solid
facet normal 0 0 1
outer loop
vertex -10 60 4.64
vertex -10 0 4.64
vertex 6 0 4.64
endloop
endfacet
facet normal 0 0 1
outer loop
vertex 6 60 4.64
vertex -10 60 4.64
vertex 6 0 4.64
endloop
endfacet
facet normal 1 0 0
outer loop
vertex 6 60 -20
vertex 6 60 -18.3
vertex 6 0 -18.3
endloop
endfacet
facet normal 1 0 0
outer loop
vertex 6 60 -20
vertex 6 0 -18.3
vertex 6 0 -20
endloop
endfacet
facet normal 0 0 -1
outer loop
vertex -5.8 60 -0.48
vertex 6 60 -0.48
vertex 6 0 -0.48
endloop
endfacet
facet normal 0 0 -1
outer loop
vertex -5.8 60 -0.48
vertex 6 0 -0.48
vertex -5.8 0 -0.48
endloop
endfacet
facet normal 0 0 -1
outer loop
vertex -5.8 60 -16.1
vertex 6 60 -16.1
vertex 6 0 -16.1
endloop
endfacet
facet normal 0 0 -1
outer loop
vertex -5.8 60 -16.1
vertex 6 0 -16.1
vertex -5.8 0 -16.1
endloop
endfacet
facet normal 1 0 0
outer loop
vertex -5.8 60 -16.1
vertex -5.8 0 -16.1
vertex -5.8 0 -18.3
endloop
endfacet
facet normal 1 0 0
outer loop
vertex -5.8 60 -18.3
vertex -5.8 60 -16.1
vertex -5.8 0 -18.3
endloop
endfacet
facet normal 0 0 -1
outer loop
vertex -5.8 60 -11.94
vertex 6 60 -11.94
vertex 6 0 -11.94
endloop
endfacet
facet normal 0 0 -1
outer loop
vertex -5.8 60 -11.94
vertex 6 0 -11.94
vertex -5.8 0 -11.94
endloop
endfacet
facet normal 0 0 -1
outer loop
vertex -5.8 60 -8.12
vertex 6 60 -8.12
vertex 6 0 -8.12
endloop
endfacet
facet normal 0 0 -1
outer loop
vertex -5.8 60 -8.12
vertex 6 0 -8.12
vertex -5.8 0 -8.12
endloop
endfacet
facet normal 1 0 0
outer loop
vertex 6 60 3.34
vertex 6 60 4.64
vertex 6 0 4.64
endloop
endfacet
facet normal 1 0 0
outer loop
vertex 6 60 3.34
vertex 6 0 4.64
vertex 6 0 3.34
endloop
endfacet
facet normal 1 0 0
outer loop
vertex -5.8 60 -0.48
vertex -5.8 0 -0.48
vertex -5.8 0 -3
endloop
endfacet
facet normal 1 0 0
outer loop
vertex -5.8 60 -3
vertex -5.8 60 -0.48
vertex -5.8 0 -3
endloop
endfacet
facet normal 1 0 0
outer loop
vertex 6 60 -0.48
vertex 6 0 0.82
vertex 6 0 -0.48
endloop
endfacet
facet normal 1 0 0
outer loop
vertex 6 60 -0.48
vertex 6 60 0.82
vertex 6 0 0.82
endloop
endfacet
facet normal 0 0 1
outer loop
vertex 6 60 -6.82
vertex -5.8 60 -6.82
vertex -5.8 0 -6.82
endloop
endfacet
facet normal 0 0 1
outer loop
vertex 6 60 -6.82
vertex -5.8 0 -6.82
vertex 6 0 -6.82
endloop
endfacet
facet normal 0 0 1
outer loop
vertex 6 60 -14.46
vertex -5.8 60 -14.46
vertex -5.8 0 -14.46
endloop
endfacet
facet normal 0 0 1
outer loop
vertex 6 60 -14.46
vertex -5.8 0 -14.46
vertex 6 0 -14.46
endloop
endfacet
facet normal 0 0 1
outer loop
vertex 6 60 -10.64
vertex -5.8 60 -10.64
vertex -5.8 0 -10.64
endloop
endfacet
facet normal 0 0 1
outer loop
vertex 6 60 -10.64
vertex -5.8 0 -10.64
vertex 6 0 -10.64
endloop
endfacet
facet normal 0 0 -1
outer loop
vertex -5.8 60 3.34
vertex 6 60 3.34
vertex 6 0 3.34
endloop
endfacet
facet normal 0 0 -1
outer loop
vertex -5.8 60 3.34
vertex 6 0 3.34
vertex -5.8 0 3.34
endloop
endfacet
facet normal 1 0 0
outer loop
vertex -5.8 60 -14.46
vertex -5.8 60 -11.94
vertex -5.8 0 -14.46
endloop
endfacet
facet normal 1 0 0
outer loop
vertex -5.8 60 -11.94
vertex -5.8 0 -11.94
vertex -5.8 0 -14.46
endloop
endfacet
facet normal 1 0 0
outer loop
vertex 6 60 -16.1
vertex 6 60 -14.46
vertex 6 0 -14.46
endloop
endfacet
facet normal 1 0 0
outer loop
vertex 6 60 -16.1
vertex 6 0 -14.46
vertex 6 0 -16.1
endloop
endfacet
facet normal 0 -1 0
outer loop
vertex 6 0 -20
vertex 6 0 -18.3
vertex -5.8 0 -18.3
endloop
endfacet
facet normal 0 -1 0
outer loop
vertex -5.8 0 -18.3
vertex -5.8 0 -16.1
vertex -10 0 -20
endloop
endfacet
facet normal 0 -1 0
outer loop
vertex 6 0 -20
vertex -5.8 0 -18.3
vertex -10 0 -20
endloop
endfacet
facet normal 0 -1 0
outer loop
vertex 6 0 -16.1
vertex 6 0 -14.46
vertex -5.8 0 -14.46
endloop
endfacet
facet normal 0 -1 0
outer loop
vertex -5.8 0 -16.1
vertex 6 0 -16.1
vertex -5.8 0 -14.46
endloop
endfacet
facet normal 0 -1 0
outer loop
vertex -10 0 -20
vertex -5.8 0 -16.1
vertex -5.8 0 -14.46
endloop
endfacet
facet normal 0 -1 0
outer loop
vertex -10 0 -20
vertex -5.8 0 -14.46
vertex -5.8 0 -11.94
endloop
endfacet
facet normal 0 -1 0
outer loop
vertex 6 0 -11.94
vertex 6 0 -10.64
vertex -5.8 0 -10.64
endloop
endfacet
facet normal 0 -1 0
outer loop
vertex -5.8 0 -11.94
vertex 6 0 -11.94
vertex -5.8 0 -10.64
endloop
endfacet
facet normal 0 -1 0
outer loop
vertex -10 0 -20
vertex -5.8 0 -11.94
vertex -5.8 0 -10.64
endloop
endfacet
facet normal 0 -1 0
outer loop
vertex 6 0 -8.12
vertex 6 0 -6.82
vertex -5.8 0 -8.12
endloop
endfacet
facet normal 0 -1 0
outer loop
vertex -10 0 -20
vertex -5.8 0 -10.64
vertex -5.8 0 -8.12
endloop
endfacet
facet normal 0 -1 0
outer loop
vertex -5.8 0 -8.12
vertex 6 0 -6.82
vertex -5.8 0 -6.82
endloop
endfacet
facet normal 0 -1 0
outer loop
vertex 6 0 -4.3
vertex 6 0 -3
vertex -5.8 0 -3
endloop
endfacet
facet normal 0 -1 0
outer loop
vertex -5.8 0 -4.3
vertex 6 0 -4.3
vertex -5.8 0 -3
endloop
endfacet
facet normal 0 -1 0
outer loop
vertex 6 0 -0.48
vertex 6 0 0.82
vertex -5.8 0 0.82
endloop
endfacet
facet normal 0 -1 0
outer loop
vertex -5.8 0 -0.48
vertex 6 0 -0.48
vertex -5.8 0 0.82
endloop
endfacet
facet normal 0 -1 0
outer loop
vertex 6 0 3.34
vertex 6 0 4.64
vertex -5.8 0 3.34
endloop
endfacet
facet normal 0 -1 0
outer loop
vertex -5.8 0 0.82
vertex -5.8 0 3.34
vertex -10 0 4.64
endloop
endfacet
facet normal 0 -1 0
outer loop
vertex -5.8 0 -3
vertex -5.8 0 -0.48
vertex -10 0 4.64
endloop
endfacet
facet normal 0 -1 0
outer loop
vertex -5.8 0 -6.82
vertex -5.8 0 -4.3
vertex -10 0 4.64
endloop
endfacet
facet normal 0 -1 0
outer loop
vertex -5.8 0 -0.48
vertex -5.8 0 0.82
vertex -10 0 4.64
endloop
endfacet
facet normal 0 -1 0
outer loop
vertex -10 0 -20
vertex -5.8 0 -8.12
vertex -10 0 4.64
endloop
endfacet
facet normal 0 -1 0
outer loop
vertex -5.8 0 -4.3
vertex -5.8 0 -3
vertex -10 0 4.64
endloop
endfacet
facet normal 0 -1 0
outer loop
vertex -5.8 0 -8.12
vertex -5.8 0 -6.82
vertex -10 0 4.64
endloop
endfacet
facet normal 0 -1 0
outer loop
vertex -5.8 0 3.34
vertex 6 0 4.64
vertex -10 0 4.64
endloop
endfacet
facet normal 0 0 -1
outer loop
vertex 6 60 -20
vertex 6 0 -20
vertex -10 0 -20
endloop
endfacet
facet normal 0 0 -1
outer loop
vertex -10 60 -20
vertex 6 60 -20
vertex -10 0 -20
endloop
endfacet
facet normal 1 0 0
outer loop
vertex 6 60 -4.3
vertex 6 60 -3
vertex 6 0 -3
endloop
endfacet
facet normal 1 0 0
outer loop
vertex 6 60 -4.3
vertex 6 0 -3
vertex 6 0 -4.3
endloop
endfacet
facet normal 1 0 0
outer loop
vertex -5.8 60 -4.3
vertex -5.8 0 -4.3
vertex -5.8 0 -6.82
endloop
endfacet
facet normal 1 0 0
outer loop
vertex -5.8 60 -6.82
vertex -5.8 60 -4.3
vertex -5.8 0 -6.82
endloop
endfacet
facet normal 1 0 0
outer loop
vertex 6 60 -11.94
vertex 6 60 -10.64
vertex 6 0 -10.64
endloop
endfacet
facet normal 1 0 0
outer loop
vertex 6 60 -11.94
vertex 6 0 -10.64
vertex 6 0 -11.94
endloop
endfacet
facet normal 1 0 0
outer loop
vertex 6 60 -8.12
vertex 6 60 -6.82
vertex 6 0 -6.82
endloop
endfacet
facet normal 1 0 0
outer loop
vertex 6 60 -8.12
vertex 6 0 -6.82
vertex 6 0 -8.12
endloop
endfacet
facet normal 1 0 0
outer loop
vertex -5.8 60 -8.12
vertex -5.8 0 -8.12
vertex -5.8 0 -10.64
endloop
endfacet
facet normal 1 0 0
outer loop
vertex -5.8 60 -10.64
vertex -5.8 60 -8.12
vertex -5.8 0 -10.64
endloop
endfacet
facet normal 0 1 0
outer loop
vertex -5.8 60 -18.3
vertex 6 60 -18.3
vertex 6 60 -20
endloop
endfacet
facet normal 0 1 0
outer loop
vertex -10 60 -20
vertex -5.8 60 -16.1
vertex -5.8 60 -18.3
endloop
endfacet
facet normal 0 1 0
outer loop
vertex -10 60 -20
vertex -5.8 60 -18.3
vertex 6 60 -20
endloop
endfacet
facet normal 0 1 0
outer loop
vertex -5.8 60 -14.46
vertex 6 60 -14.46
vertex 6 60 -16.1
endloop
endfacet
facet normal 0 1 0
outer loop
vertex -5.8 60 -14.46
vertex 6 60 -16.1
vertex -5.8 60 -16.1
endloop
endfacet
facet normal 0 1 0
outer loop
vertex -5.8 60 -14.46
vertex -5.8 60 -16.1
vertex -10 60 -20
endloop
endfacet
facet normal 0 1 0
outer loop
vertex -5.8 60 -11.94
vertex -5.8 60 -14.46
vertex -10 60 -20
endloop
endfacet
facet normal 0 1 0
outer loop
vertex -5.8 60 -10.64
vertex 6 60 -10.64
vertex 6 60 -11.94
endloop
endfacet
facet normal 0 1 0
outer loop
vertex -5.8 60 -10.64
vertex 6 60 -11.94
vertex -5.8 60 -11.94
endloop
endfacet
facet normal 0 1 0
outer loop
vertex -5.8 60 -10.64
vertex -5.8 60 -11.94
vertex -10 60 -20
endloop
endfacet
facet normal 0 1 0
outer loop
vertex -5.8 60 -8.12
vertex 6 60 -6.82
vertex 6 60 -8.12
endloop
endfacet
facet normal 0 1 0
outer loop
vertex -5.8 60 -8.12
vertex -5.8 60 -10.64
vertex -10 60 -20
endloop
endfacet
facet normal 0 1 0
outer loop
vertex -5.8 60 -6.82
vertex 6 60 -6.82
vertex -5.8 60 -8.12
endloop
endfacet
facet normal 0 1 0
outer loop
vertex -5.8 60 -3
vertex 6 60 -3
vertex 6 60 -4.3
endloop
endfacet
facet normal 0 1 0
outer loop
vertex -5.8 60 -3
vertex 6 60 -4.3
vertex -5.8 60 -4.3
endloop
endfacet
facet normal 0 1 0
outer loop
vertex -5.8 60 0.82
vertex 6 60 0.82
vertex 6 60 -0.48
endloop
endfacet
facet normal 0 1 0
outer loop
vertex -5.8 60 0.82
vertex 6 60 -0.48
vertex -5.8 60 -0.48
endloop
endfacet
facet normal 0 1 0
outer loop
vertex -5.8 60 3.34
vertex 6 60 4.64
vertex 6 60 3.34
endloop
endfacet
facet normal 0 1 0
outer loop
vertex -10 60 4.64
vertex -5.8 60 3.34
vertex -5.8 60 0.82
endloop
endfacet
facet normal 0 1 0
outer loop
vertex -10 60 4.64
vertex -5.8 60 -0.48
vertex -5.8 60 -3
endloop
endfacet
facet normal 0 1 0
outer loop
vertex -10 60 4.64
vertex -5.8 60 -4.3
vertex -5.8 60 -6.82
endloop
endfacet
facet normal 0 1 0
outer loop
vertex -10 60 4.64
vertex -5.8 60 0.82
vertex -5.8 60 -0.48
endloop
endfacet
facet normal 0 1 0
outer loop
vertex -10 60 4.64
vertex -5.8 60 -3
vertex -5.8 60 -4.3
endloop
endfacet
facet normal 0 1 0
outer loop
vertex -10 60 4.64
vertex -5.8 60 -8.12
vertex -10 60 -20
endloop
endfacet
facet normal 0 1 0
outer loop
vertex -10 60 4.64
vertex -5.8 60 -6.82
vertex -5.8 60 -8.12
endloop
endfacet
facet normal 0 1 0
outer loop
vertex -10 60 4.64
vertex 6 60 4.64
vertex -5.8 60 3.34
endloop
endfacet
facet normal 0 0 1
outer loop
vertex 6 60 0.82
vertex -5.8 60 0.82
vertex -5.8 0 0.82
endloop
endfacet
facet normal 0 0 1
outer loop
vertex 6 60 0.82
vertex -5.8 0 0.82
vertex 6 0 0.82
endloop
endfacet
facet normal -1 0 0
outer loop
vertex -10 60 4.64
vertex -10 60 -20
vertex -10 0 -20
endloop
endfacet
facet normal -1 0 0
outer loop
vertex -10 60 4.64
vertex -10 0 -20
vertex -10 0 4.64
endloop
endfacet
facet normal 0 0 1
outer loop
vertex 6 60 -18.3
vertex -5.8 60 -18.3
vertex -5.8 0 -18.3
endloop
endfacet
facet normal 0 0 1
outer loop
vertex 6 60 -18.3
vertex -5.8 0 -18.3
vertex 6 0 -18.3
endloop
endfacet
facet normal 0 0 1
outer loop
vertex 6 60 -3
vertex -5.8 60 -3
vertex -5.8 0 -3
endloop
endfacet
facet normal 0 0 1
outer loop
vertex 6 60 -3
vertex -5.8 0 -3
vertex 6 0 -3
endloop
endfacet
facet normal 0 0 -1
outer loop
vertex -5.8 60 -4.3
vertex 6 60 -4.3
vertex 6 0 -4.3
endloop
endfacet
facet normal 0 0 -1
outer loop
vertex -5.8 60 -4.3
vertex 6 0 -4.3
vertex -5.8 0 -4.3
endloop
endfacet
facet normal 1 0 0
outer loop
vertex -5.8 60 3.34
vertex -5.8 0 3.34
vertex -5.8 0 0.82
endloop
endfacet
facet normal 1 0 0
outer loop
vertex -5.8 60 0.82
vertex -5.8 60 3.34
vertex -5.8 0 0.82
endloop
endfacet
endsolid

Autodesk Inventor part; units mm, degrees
ref_plane "YZ Plane" through (0, 0, 0) normal (1, 0, 0) x (0, 1, 0)
ref_plane "XZ Plane" through (0, 0, 0) normal (0, 1, 0) x (-1, 0, 0)
ref_plane "XY Plane" through (0, 0, 0) normal (0, 0, 1) x (1, 0, 0)
sketch "Sketch1" plane through (0, 0, 0) normal (0, 1, 0) x (-1, 0, 0)
  line L0 (-10, -20) -> (10, -20)
  line L1 (10, -20) -> (10, 20)
  line L2 (10, 20) -> (-10, 20)
  line L3 (-10, 20) -> (-10, -20)
  line L4 (-10, -20) -> (10, 20) construction
  line L5 (10, -20) -> (-10, 20) construction
  point P0 (0, 0)
  dimension "d0" = 20
  dimension "d1" = 40
extrude "Extrusion1" add sketch "Sketch1" along normal blind 60
sketch "Sketch2" plane through (0, 0, 0) normal (0, -1, 0) x (1, 0, 0)
  line L0 (10, -20) -> (-10, -20) projected
  line L1 (10, 20) -> (10, -20) projected
  line L2 (-10, 20) -> (10, 20) projected
  line L3 (-10, -20) -> (-10, 20) projected
  line L4 (10, 20) -> (10, -20) projected
  line L5 (10, 18.3) -> (-5.8, 18.3)
  line L6 (-5.8, 18.3) -> (-5.8, 16.1)
  line L7 (-5.8, 16.1) -> (10, 16.1)
  line L8 (10, 16.1) -> (10, 18.3)
  point P0 (0, 0)
  dimension "d4" = 1.7
  dimension "d5" = 4.2
  dimension "d6" = 2.2
extrude "Extrusion2" cut sketch "Sketch2" against normal through all contours L7 L6 L5 L1
mirror "Mirror1" about plane through (0, 0, 0) normal (0, 0, 1) of "Extrusion2"
sketch "Sketch3" plane through (0, 0, 0) normal (0, -1, 0) x (1, 0, 0)
  line L0 (-5.8, -16.1) -> (10, -16.1) projected
  line L1 (10, 16.1) -> (10, -16.1) projected
  line L2 (10, 16.1) -> (-5.8, 16.1) projected
  line L3 (-5.8, 16.1) -> (-5.8, 18.3) projected
  line L4 (-5.8, 18.3) -> (10, 18.3) projected
  line L5 (10, 20) -> (10, 18.3) projected
  line L6 (-10, 20) -> (10, 20) projected
  line L7 (-10, -20) -> (-10, 20) projected
  line L8 (10, -20) -> (-10, -20) projected
  line L9 (10, -18.3) -> (10, -20) projected
  line L10 (10, -18.3) -> (-5.8, -18.3) projected
  line L11 (-5.8, -18.3) -> (-5.8, -16.1) projected
  line L12 (10, 14.8) -> (-5.8, 14.8)
  line L13 (-5.8, 14.8) -> (-5.8, 12.28)
  line L14 (-5.8, 12.28) -> (10, 12.28)
  line L15 (10, 12.28) -> (10, 14.8)
  point P0 (0, 0)
  dimension "d9" = 1.3
  dimension "d10" = 2.52
extrude "Extrusion3" cut sketch "Sketch3" against normal through all contours L14 L13 L12 L1
pattern_linear "Rectangular Pattern1" count 8 spacing 3.82 along (0, 0, -1) of "Extrusion3"
sketch "Sketch4" plane through (-10, 0, 20) normal (0, 0, 1) x (1, 0, 0)
  line L0 (-20.7139, 77.7692) -> (45.2661, 77.7692)
  line L1 (45.2661, 77.7692) -> (45.2661, -19.6204)
  line L2 (45.2661, -19.6204) -> (-20.7139, -19.6204)
  line L3 (-20.7139, -19.6204) -> (-20.7139, 77.7692)
  point P0 (10, 0)
extrude "Extrusion4" cut sketch "Sketch4" against normal up to surface (15.36 mm away)
sketch "Sketch5" plane through (10, 0, 4.64) normal (1, 0, 0) x (0, 0, -1)
  line L0 (-2.9581, -8.043) -> (28.5295, -8.043)
  line L1 (28.5295, -8.043) -> (28.5295, 70.3336)
  line L2 (28.5295, 70.3336) -> (-2.9581, 70.3336)
  line L3 (-2.9581, 70.3336) -> (-2.9581, -8.043)
  point P0 (4.64, 0)
extrude "Extrusion5" cut sketch "Sketch5" against normal blind 4
properties part number "Jetson_Heatsink"
